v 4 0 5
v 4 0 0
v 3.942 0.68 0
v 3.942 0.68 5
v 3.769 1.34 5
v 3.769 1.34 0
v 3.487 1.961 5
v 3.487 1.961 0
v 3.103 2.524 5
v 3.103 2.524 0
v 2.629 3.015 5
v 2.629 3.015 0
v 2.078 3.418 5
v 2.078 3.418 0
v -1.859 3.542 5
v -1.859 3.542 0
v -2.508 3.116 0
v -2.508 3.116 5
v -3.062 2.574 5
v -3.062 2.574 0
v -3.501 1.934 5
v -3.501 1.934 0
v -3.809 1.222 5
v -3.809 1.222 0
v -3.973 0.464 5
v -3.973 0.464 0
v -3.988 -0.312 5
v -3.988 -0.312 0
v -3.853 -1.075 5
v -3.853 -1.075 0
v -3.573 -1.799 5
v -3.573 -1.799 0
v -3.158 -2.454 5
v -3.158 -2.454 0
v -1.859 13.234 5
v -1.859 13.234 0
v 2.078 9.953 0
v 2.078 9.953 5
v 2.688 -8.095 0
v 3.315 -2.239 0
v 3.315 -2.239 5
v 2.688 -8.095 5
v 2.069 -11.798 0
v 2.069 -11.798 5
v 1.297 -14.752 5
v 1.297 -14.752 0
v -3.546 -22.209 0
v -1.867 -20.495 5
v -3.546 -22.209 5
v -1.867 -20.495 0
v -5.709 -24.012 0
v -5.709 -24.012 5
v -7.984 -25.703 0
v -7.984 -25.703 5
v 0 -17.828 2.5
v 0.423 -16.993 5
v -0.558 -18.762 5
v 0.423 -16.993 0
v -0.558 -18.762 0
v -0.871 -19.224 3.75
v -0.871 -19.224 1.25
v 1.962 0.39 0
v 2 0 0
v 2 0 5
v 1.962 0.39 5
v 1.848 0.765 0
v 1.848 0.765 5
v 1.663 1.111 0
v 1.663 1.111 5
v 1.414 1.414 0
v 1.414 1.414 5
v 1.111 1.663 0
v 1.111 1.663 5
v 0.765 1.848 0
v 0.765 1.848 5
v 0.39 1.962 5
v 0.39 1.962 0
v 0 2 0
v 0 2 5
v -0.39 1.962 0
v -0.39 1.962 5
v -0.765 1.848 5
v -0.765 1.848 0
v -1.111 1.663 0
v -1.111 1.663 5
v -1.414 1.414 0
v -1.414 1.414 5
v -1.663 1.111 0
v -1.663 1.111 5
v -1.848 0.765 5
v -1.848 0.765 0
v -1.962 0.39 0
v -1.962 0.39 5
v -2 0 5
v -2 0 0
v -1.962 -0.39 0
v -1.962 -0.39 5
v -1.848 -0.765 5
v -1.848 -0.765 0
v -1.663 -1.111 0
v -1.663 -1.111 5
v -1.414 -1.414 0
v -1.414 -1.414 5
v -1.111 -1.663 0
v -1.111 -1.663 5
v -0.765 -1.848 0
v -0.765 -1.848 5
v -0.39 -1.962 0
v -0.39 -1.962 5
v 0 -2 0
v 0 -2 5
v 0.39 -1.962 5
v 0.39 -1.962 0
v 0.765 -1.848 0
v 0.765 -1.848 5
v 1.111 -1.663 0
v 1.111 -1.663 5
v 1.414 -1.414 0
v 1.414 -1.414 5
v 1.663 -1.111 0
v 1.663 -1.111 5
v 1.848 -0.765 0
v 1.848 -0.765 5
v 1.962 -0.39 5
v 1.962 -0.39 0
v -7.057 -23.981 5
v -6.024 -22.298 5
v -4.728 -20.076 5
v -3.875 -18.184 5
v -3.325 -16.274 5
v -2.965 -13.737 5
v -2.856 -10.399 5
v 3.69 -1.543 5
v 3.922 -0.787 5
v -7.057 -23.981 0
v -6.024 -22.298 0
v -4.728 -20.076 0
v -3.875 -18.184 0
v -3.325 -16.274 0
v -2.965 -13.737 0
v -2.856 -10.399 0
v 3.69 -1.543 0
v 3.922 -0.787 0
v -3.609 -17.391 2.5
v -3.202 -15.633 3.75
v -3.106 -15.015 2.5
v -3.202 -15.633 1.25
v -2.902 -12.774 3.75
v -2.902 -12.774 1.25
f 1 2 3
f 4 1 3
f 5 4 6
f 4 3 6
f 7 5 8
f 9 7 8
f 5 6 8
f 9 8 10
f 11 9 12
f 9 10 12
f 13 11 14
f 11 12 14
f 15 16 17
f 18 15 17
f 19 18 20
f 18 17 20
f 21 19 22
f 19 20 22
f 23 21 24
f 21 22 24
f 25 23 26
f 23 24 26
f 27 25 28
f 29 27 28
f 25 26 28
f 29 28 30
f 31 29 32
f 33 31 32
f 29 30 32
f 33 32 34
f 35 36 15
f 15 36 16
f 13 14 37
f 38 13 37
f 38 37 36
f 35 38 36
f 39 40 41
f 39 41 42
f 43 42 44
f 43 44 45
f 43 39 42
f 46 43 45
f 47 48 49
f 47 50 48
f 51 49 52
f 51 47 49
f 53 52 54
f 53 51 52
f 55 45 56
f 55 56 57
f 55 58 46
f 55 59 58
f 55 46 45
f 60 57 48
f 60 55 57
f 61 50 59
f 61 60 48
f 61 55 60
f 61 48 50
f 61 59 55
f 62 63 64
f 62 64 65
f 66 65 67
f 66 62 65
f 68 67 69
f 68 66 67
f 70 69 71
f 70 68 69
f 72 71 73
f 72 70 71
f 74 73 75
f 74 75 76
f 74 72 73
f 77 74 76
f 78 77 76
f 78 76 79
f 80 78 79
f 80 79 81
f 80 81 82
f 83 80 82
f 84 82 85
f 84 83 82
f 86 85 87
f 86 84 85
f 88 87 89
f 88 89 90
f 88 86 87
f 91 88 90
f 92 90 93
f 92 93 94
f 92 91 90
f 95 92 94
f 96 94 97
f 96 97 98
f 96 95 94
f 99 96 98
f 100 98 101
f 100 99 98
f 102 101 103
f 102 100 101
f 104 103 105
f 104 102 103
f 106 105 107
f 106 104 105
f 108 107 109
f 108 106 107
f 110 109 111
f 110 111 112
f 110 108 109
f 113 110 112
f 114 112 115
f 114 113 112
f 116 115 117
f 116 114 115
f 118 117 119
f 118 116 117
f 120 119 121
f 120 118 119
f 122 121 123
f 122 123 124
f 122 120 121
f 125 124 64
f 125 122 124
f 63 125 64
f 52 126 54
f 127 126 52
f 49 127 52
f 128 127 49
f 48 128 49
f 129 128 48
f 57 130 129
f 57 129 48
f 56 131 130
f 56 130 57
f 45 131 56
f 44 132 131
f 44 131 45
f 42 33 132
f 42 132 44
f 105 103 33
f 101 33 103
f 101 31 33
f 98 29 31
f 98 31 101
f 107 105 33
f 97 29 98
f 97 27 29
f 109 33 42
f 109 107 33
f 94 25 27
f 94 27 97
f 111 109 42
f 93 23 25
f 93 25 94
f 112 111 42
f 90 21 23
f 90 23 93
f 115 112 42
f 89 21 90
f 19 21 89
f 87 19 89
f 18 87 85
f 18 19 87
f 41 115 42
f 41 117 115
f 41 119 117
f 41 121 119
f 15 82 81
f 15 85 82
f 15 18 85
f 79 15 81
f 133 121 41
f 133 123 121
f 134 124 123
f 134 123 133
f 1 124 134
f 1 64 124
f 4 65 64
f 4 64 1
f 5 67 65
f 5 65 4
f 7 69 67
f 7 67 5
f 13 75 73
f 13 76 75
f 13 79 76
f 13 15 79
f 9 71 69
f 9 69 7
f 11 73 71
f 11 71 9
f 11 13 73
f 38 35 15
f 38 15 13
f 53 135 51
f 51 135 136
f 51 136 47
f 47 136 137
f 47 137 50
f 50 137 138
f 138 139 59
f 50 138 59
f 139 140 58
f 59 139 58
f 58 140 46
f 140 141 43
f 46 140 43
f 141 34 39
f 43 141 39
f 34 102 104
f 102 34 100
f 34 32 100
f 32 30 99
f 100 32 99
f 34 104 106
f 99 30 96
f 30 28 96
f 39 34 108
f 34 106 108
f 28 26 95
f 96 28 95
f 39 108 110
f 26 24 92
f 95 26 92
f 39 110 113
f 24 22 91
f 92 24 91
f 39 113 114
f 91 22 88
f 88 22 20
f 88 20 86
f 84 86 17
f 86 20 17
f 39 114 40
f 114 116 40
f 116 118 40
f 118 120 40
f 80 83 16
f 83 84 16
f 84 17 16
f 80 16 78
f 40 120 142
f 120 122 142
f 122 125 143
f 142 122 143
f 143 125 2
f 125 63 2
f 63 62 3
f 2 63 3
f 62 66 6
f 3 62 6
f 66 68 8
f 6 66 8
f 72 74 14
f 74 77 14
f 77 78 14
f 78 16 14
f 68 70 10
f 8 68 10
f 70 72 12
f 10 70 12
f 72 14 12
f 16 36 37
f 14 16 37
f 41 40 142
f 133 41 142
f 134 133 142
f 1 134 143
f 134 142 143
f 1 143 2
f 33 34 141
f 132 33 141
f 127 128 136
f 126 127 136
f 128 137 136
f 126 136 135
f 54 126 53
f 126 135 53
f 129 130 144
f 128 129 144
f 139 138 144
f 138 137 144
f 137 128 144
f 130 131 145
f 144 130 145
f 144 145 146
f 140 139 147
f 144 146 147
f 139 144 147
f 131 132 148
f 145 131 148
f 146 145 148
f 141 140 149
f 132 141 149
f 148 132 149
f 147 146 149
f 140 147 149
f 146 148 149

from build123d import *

# Parameters (mm, degrees)
F0_R     = 2
F1_DEPTH = 5


with BuildPart() as f1:
    # F0 (on Top) → F1 (new body)
    with BuildSketch(Plane.XY):
        with BuildLine():
            ThreePointArc((-1.8593732966, 3.5415718183), (0.1256674698, 3.9980254735), (2.0781231578, 3.4178069198))
            Line((2.0781231578, 3.4178069198), (2.0781231578, 9.95312538))
            Line((2.0781231578, 9.95312538), (-1.8593732966, 13.2343750447))
            Line((-1.8593732966, 13.2343750447), (-1.8593732966, 3.5415718183))
        make_face()
        with BuildLine():
            ThreePointArc((3.3147150847, -2.2388979224), (3.8248438098, -1.1707133853), (4, 0))
            ThreePointArc((4, 0), (3.4865808919, 1.9605493323), (2.0781231578, 3.4178069198))
            ThreePointArc((2.0781231578, 3.4178069198), (0.1256674698, 3.9980254735), (-1.8593732966, 3.5415718183))
            ThreePointArc((-1.8593732966, 3.5415718183), (-3.9093033939, 0.8469633845), (-3.1584306628, -2.4544481556))
            ThreePointArc((-3.1584306628, -2.4544481556), (0.1331228038, -3.9977841762), (3.3147150847, -2.2388979224))
        make_face()
        Circle(F0_R, mode=Mode.SUBTRACT)
        with BuildLine():
            add(Edge.make_bspline(
                [(3.3147150847, -2.2388979224), (2.7708082025, -7.9966705645), (1.7749881346, -18.5865607153), (-4.9275215468, -23.4735932789), (-7.9843755811, -25.7031265646)],
                knots=[0, 0, 0, 0, 0.5438220711, 1, 1, 1, 1], degree=3))
            ThreePointArc((3.3147150847, -2.2388979224), (0.1331228038, -3.9977841762), (-3.1584306628, -2.4544481556))
            add(Edge.make_bspline(
                [(-3.1584306628, -2.4544481556), (-2.9708882556, -7.7977456433), (-1.9257495096, -17.6899848541), (-6.6804976422, -22.9462452047), (-7.9843755811, -25.7031265646)],
                knots=[0, 0, 0, 0, 0.5577685344, 1, 1, 1, 1], degree=3))
        make_face()
    extrude(amount=F1_DEPTH)


solid = f1.part
